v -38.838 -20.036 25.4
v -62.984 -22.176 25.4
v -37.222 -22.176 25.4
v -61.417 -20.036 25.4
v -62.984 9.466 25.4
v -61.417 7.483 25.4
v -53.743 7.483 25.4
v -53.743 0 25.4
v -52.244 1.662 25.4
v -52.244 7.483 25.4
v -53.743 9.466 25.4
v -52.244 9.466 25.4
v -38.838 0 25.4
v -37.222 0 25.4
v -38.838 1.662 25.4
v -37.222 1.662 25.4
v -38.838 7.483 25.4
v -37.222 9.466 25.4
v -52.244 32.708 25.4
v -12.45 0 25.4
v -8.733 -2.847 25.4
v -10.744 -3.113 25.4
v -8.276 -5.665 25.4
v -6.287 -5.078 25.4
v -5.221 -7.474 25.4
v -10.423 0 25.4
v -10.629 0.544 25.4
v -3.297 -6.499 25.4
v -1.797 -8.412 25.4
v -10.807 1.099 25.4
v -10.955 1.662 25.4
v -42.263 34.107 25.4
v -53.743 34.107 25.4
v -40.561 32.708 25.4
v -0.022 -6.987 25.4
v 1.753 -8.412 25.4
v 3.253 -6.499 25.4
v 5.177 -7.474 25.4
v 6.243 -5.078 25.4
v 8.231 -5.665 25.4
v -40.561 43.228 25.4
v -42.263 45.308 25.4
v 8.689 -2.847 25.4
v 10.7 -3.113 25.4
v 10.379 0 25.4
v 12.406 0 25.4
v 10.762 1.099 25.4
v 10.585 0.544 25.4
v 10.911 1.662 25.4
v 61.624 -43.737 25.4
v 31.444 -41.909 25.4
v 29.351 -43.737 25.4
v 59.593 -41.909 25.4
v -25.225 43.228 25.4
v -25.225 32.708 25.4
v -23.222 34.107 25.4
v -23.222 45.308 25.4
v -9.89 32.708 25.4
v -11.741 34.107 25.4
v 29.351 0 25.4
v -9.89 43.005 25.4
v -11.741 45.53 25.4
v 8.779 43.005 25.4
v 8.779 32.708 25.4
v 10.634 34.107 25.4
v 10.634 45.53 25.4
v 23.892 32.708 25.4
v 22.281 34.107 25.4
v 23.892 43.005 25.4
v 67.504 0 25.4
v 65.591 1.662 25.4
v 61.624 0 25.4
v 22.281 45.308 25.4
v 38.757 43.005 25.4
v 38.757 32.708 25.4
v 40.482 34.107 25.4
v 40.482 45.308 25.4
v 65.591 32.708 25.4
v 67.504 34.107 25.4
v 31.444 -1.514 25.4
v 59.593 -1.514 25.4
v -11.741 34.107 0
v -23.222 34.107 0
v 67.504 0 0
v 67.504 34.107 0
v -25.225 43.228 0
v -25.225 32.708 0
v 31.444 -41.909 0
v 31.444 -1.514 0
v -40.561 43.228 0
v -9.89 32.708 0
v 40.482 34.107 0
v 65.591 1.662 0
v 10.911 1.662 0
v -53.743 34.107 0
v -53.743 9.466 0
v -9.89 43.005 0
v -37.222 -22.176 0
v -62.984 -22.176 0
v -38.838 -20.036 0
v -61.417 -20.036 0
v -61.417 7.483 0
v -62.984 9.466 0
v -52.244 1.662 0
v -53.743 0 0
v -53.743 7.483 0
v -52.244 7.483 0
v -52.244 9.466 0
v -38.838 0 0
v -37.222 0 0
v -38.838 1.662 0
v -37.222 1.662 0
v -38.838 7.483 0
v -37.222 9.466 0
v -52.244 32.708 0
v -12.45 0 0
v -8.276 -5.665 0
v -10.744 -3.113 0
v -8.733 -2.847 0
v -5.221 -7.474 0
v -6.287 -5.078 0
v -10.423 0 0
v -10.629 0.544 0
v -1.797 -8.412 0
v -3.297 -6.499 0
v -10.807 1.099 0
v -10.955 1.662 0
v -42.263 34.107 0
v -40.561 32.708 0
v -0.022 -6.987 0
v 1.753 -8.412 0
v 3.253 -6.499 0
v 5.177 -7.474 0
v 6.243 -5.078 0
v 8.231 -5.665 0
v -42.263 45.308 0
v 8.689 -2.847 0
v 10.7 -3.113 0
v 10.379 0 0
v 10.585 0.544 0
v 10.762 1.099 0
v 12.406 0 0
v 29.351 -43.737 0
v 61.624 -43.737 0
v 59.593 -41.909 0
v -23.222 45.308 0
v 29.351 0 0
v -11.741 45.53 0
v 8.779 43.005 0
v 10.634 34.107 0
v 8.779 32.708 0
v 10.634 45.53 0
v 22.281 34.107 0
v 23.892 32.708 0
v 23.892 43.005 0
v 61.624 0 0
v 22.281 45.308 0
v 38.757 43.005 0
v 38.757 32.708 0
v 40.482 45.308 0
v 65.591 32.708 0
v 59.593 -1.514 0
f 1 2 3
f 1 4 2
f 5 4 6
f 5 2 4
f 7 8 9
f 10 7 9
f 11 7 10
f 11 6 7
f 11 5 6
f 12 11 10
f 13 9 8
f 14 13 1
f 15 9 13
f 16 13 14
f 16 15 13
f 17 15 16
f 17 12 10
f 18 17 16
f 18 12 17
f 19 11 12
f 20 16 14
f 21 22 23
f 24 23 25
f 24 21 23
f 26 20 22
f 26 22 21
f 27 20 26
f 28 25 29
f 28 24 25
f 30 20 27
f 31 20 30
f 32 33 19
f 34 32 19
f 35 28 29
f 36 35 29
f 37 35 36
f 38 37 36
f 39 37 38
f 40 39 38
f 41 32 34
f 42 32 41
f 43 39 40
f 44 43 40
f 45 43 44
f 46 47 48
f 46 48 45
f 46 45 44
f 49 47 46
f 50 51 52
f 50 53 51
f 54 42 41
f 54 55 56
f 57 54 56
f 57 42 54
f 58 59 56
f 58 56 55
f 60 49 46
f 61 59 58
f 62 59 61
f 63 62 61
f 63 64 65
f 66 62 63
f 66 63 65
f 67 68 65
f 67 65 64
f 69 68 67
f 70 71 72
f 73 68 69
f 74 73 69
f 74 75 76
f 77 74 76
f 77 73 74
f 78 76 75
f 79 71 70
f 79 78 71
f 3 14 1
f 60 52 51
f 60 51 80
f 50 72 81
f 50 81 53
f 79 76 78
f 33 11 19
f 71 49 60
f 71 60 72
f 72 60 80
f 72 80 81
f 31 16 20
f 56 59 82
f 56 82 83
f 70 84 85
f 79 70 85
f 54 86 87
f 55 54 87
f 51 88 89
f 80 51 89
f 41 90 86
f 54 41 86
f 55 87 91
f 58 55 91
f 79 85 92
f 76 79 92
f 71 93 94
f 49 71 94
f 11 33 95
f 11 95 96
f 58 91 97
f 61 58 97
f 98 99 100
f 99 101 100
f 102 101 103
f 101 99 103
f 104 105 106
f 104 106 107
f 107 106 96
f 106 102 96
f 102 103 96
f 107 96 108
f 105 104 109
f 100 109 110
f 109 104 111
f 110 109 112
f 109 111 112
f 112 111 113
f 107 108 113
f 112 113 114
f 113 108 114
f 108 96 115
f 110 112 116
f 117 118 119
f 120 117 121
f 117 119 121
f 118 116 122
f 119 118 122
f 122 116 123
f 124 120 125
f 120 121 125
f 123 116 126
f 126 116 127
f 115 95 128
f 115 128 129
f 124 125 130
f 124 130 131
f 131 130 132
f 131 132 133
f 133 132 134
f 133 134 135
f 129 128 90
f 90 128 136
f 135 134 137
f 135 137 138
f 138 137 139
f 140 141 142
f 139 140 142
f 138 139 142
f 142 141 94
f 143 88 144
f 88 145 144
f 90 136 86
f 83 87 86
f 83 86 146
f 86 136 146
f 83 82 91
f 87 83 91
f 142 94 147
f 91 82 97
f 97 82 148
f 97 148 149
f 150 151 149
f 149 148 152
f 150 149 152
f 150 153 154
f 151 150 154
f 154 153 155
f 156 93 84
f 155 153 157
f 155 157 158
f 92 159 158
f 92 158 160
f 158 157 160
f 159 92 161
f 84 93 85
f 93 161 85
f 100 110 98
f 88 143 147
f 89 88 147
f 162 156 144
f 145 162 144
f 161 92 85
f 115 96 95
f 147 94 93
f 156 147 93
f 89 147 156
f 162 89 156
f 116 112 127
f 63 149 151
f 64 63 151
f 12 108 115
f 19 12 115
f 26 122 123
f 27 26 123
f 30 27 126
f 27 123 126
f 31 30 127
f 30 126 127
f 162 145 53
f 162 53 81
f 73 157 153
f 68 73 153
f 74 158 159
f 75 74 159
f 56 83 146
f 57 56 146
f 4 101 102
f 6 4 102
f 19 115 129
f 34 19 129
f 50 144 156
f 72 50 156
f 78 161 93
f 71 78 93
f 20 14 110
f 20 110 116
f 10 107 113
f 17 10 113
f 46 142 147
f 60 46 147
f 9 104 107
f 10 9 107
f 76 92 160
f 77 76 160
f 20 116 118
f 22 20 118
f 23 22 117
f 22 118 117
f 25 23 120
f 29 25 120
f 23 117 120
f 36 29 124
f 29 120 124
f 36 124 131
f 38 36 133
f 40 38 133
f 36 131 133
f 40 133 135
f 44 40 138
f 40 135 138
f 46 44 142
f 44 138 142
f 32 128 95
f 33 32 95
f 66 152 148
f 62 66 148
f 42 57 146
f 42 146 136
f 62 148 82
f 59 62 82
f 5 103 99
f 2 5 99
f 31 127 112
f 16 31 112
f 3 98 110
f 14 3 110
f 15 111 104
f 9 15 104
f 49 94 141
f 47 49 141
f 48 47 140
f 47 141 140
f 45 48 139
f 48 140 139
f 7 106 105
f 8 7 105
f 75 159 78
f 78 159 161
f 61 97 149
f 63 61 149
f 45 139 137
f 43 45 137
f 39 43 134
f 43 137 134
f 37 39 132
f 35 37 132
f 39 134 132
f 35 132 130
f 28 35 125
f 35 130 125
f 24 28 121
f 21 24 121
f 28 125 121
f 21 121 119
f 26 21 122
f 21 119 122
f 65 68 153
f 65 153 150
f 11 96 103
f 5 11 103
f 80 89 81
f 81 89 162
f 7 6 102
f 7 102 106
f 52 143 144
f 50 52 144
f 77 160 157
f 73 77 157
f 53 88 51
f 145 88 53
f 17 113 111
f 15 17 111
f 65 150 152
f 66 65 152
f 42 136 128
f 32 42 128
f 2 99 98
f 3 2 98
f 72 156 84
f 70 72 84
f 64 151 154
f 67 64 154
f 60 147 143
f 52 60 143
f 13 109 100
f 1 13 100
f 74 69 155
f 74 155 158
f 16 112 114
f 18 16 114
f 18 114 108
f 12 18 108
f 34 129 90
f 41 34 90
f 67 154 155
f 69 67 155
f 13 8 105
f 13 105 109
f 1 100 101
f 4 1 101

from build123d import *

# Parameters (mm, degrees)
F0_W     = 1.4990121126
F0_H     = 1.9831014797
F0_W_2   = 1.6156211495
F0_H_2   = 1.6615597997
F0_W_3   = 28.149546124
F0_H_3   = 40.3955862857
F1_DEPTH = 25.4


with BuildPart() as f1:
    # F0 (on Top) → F1 (new body)
    with BuildSketch(Plane.XY):
        Polygon((-11.7408363149, 45.5303452909), (-11.7408363149, 34.1073982418), (-9.8901251331, 34.1073982418), (-9.8901251331, 43.0053770542), (8.778876625, 43.0053770542), (8.778876625, 34.1073982418), (10.634101578, 34.1073982418), (10.634101578, 45.5303452909), align=None)
        Polygon((-42.2627404332, 45.3080944717), (-42.2627404332, 34.1073982418), (-40.5606254935, 34.1073982418), (-40.5606254935, 43.2276241481), (-25.2253748477, 43.2276241481), (-25.2253748477, 34.1073982418), (-23.2215542346, 34.1073982418), (-23.2215542346, 45.3080944717), align=None)
        Polygon((-23.2215542346, 34.1073982418), (-25.2253748477, 34.1073982418), (-25.2253748477, 32.7079482377), (-9.8901251331, 32.7079482377), (-9.8901251331, 34.1073982418), (-11.7408363149, 34.1073982418), align=None)
        Polygon((-42.2627404332, 34.1073982418), (-53.743455559, 34.1073982418), (-53.743455559, 9.4658602029), (-52.2444434464, 9.4658602029), (-52.2444434464, 32.7079482377), (-40.5606254935, 32.7079482377), (-40.5606254935, 34.1073982418), align=None)
        Polygon((-53.743455559, 7.4827587232), (-53.743455559, 9.4658602029), (-62.9840344191, 9.4658602029), (-62.9840344191, -22.1761129797), (-37.2224263847, -22.1761129797), (-37.2224263847, 0), (-38.8380475342, 0), (-38.8380475342, -20.0356338173), (-61.4172406495, -20.0356338173), (-61.4172406495, 7.4827587232), align=None)
        Polygon((-52.2444434464, 7.4827587232), (-53.743455559, 7.4827587232), (-53.743455559, 0), (-38.8380475342, 0), (-38.8380475342, 1.6615597997), (-52.2444434464, 1.6615597997), align=None)
        Polygon((-37.2224263847, 9.4658602029), (-52.2444434464, 9.4658602029), (-52.2444434464, 7.4827587232), (-38.8380475342, 7.4827587232), (-38.8380475342, 1.6615597997), (-37.2224263847, 1.6615597997), align=None)
        with Locations((-52.9939495027, 8.4743094631)):
            Rectangle(F0_W, F0_H)
        with Locations((-38.0302369595, 0.8307798998)):
            Rectangle(F0_W_2, F0_H_2)
        with BuildLine():
            Line((-10.9551865608, 1.6615597997), (-37.2224263847, 1.6615597997))
            Line((-37.2224263847, 1.6615597997), (-37.2224263847, 0))
            Line((-37.2224263847, 0), (-12.4503001571, 0))
            Line((-12.4503001571, 0), (-10.4229850138, 0))
            ThreePointArc((-10.4229850138, 0), (-10.7213890086, 0.8204331014), (-10.9551865608, 1.6615597997))
        make_face()
        with BuildLine():
            Line((31.4435763285, 1.6615597997), (10.9108546749, 1.6615597997))
            ThreePointArc((10.9108546749, 1.6615597997), (10.6770571227, 0.8204331014), (10.378653128, 0))
            Line((10.378653128, 0), (12.4059682712, 0))
            Line((12.4059682712, 0), (29.3507482857, 0))
            Line((29.3507482857, 0), (31.4435763285, 0))
            Line((31.4435763285, 0), (31.4435763285, 1.6615597997))
        make_face()
        with BuildLine():
            Line((-10.4229850138, 0), (-12.4503001571, 0))
            ThreePointArc((-12.4503001571, 0), (-0.0221659429, -8.5303409081), (12.4059682712, 0))
            Line((12.4059682712, 0), (10.378653128, 0))
            ThreePointArc((10.378653128, 0), (-0.0221659429, -6.9872415007), (-10.4229850138, 0))
        make_face()
        Polygon((31.4435763285, 0), (29.3507482857, 0), (29.3507482857, -43.7374562025), (61.623737216, -43.7374562025), (61.623737216, 0), align=None)
        with Locations((45.5183493905, -21.7114321422)):
            Rectangle(F0_W_3, F0_H_3, mode=Mode.SUBTRACT)
        Polygon((65.5907168984, 1.6615597997), (31.4435763285, 1.6615597997), (31.4435763285, 0), (61.623737216, 0), (67.5041079521, 0), (67.5041079521, 34.1073982418), (40.482412558, 34.1073982418), (38.7573502958, 34.1073982418), (38.7573502958, 32.7079482377), (65.5907168984, 32.7079482377), align=None)
        Polygon((22.2812830471, 34.1073982418), (23.8918736577, 34.1073982418), (23.8918736577, 43.0053770542), (38.7573502958, 43.0053770542), (38.7573502958, 34.1073982418), (40.482412558, 34.1073982418), (40.482412558, 45.3080944717), (22.2812830471, 45.3080944717), align=None)
        Polygon((8.778876625, 34.1073982418), (8.778876625, 32.7079482377), (23.8918736577, 32.7079482377), (23.8918736577, 34.1073982418), (22.2812830471, 34.1073982418), (10.634101578, 34.1073982418), align=None)
    extrude(amount=F1_DEPTH)


solid = f1.part
